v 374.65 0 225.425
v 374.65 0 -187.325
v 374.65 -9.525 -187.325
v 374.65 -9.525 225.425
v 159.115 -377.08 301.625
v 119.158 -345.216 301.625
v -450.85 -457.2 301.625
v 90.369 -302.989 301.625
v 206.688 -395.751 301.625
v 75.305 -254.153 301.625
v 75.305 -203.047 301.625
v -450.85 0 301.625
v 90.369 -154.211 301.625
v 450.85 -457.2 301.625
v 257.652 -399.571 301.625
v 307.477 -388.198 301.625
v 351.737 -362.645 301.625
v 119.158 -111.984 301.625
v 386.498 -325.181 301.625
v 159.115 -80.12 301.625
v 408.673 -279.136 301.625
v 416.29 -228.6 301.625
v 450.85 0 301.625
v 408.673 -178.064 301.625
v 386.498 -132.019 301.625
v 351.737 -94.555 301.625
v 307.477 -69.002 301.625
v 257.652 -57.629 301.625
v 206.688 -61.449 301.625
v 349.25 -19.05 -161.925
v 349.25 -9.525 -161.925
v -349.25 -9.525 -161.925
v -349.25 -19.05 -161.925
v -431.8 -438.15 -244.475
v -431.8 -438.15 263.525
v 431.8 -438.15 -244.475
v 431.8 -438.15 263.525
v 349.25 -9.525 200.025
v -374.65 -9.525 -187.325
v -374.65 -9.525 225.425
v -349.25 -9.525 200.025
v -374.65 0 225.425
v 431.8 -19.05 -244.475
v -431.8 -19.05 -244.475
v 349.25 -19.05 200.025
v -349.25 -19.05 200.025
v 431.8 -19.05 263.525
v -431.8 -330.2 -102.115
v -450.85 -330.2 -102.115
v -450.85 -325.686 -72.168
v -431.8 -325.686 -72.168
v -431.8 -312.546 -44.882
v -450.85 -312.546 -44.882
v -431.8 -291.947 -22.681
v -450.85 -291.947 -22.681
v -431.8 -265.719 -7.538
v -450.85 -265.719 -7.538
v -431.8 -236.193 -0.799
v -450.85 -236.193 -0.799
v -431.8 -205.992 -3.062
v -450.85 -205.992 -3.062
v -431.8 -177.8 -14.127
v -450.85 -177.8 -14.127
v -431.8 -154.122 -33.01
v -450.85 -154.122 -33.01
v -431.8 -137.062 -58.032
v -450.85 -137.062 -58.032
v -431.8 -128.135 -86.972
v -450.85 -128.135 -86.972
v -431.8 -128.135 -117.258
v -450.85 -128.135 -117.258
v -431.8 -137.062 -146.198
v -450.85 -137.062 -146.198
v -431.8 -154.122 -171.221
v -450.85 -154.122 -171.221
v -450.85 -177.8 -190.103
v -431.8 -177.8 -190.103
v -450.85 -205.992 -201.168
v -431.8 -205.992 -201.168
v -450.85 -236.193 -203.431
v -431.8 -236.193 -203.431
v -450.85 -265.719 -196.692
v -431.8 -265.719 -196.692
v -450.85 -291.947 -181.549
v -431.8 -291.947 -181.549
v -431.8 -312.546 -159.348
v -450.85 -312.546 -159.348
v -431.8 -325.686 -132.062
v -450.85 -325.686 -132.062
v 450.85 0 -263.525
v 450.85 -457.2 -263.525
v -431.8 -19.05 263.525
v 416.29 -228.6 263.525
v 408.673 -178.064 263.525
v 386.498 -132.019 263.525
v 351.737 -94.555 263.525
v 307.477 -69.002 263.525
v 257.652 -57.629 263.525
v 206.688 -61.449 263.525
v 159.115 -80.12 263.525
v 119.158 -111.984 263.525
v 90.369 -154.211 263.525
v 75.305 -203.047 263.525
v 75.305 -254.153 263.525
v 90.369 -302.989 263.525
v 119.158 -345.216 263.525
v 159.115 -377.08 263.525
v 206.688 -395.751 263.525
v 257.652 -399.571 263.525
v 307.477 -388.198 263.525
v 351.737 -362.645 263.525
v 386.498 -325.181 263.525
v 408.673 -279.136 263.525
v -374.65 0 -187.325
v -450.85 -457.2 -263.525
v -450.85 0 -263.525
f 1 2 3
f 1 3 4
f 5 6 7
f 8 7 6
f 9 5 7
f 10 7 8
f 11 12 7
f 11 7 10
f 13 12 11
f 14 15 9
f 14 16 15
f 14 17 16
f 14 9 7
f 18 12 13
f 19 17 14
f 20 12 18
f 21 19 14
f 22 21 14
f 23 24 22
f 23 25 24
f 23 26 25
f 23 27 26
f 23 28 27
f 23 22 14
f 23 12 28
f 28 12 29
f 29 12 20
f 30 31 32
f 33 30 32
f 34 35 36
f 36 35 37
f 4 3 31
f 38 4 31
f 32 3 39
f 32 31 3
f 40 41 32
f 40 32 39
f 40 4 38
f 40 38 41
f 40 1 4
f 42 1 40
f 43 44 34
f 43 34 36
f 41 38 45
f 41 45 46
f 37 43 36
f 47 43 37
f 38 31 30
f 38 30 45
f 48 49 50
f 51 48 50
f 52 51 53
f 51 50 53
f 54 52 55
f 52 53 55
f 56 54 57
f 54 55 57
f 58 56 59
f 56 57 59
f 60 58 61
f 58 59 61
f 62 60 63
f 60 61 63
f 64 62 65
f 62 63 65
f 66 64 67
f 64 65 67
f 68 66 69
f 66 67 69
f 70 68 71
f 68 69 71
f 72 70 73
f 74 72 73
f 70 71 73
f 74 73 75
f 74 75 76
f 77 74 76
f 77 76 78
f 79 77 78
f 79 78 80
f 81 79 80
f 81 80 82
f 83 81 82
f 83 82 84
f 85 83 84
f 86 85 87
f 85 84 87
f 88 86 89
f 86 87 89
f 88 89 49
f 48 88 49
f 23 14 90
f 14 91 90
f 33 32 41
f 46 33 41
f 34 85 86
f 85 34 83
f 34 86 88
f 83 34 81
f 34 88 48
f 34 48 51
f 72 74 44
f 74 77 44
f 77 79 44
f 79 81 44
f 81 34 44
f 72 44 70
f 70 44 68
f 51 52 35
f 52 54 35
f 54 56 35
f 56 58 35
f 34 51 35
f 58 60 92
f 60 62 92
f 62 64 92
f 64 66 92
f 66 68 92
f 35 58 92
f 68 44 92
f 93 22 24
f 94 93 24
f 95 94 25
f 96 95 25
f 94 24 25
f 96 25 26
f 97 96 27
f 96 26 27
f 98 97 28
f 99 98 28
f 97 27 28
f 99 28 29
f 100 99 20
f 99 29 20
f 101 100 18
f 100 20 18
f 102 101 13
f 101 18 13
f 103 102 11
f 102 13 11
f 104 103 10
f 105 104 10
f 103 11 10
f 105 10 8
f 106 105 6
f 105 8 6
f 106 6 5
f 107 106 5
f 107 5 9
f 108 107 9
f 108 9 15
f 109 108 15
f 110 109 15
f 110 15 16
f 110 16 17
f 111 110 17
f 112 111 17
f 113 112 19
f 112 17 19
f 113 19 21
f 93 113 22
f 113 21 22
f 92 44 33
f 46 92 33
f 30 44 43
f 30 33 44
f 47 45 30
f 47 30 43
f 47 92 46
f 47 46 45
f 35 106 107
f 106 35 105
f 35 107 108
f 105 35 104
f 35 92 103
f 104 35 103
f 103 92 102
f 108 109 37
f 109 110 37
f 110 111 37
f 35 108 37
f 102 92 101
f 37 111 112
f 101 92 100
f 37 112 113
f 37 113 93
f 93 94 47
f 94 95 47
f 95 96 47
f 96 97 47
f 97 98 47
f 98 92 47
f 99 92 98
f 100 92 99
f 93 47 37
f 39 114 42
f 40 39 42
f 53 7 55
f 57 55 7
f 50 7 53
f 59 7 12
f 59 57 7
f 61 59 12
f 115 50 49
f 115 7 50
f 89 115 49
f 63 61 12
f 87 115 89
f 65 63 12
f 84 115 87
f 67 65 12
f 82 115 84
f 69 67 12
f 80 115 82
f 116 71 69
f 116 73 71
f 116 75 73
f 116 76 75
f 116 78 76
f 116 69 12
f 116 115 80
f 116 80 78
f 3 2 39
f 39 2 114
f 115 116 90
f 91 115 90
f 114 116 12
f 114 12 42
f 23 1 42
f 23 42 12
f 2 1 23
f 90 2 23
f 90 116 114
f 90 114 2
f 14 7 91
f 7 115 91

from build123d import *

# Parameters (mm, degrees)
F0_W      = 901.7
F0_H      = 527.05
F1_DEPTH  = 457.2
F2_T      = -19.05
F3_W      = 901.7
F3_H      = 457.2
F4_DEPTH  = 38.1
F5_R      = 101.6
F6_DEPTH  = 19.05
F7_R      = 171.45
F8_DEPTH  = 38.1
F9_W      = 749.3
F9_H      = 412.75
F10_DEPTH = 9.525
F11_W     = 698.5
F11_H     = 361.95
F12_DEPTH = 9.525


with BuildPart() as f1:
    # F0 (on Front) → F1 (new body)
    with BuildSketch(Plane.XZ):
        Rectangle(F0_W, F0_H)
    extrude(amount=F1_DEPTH)

    # F2
    f2_openings = [f1.faces().sort_by_distance(p)[0] for p in [
        (0, -228.6, 263.525),
    ]]
    offset(amount=F2_T, openings=f2_openings)

    # F3 (on face) → F4 (join)
    with BuildSketch(Plane.XY.offset(263.525)):
        with Locations((0, -228.6)):
            Rectangle(F3_W, F3_H)
    extrude(amount=F4_DEPTH)

    # F5 (on face) → F6 (cut, through all)
    with BuildSketch(Plane(origin=(-450.85, 0, 0), x_dir=(0, -1, 0), z_dir=(-1, 0, 0))):
        with Locations((228.6, -102.11508)):
            Circle(F5_R)
    extrude(amount=-F6_DEPTH, mode=Mode.SUBTRACT)

    # F7 (on face) → F8 (cut, through all)
    with BuildSketch(Plane.XY.offset(301.625)):
        with Locations((244.839686, -228.6)):
            Circle(F7_R)
    extrude(amount=-F8_DEPTH, mode=Mode.SUBTRACT)

    # F9 (on face) → F10 (cut)
    with BuildSketch(Plane(origin=(0, 0, 0), x_dir=(-1, 0, 0), z_dir=(0, 1, 0))):
        with Locations((0, 19.05)):
            Rectangle(F9_W, F9_H)
    extrude(amount=-F10_DEPTH, mode=Mode.SUBTRACT)

    # F11 (on face) → F12 (cut, through all)
    with BuildSketch(Plane(origin=(0, -9.525, 0), x_dir=(-1, 0, 0), z_dir=(0, 1, 0))):
        with Locations((0, 19.05)):
            Rectangle(F11_W, F11_H)
    extrude(amount=-F12_DEPTH, mode=Mode.SUBTRACT)


solid = f1.part
